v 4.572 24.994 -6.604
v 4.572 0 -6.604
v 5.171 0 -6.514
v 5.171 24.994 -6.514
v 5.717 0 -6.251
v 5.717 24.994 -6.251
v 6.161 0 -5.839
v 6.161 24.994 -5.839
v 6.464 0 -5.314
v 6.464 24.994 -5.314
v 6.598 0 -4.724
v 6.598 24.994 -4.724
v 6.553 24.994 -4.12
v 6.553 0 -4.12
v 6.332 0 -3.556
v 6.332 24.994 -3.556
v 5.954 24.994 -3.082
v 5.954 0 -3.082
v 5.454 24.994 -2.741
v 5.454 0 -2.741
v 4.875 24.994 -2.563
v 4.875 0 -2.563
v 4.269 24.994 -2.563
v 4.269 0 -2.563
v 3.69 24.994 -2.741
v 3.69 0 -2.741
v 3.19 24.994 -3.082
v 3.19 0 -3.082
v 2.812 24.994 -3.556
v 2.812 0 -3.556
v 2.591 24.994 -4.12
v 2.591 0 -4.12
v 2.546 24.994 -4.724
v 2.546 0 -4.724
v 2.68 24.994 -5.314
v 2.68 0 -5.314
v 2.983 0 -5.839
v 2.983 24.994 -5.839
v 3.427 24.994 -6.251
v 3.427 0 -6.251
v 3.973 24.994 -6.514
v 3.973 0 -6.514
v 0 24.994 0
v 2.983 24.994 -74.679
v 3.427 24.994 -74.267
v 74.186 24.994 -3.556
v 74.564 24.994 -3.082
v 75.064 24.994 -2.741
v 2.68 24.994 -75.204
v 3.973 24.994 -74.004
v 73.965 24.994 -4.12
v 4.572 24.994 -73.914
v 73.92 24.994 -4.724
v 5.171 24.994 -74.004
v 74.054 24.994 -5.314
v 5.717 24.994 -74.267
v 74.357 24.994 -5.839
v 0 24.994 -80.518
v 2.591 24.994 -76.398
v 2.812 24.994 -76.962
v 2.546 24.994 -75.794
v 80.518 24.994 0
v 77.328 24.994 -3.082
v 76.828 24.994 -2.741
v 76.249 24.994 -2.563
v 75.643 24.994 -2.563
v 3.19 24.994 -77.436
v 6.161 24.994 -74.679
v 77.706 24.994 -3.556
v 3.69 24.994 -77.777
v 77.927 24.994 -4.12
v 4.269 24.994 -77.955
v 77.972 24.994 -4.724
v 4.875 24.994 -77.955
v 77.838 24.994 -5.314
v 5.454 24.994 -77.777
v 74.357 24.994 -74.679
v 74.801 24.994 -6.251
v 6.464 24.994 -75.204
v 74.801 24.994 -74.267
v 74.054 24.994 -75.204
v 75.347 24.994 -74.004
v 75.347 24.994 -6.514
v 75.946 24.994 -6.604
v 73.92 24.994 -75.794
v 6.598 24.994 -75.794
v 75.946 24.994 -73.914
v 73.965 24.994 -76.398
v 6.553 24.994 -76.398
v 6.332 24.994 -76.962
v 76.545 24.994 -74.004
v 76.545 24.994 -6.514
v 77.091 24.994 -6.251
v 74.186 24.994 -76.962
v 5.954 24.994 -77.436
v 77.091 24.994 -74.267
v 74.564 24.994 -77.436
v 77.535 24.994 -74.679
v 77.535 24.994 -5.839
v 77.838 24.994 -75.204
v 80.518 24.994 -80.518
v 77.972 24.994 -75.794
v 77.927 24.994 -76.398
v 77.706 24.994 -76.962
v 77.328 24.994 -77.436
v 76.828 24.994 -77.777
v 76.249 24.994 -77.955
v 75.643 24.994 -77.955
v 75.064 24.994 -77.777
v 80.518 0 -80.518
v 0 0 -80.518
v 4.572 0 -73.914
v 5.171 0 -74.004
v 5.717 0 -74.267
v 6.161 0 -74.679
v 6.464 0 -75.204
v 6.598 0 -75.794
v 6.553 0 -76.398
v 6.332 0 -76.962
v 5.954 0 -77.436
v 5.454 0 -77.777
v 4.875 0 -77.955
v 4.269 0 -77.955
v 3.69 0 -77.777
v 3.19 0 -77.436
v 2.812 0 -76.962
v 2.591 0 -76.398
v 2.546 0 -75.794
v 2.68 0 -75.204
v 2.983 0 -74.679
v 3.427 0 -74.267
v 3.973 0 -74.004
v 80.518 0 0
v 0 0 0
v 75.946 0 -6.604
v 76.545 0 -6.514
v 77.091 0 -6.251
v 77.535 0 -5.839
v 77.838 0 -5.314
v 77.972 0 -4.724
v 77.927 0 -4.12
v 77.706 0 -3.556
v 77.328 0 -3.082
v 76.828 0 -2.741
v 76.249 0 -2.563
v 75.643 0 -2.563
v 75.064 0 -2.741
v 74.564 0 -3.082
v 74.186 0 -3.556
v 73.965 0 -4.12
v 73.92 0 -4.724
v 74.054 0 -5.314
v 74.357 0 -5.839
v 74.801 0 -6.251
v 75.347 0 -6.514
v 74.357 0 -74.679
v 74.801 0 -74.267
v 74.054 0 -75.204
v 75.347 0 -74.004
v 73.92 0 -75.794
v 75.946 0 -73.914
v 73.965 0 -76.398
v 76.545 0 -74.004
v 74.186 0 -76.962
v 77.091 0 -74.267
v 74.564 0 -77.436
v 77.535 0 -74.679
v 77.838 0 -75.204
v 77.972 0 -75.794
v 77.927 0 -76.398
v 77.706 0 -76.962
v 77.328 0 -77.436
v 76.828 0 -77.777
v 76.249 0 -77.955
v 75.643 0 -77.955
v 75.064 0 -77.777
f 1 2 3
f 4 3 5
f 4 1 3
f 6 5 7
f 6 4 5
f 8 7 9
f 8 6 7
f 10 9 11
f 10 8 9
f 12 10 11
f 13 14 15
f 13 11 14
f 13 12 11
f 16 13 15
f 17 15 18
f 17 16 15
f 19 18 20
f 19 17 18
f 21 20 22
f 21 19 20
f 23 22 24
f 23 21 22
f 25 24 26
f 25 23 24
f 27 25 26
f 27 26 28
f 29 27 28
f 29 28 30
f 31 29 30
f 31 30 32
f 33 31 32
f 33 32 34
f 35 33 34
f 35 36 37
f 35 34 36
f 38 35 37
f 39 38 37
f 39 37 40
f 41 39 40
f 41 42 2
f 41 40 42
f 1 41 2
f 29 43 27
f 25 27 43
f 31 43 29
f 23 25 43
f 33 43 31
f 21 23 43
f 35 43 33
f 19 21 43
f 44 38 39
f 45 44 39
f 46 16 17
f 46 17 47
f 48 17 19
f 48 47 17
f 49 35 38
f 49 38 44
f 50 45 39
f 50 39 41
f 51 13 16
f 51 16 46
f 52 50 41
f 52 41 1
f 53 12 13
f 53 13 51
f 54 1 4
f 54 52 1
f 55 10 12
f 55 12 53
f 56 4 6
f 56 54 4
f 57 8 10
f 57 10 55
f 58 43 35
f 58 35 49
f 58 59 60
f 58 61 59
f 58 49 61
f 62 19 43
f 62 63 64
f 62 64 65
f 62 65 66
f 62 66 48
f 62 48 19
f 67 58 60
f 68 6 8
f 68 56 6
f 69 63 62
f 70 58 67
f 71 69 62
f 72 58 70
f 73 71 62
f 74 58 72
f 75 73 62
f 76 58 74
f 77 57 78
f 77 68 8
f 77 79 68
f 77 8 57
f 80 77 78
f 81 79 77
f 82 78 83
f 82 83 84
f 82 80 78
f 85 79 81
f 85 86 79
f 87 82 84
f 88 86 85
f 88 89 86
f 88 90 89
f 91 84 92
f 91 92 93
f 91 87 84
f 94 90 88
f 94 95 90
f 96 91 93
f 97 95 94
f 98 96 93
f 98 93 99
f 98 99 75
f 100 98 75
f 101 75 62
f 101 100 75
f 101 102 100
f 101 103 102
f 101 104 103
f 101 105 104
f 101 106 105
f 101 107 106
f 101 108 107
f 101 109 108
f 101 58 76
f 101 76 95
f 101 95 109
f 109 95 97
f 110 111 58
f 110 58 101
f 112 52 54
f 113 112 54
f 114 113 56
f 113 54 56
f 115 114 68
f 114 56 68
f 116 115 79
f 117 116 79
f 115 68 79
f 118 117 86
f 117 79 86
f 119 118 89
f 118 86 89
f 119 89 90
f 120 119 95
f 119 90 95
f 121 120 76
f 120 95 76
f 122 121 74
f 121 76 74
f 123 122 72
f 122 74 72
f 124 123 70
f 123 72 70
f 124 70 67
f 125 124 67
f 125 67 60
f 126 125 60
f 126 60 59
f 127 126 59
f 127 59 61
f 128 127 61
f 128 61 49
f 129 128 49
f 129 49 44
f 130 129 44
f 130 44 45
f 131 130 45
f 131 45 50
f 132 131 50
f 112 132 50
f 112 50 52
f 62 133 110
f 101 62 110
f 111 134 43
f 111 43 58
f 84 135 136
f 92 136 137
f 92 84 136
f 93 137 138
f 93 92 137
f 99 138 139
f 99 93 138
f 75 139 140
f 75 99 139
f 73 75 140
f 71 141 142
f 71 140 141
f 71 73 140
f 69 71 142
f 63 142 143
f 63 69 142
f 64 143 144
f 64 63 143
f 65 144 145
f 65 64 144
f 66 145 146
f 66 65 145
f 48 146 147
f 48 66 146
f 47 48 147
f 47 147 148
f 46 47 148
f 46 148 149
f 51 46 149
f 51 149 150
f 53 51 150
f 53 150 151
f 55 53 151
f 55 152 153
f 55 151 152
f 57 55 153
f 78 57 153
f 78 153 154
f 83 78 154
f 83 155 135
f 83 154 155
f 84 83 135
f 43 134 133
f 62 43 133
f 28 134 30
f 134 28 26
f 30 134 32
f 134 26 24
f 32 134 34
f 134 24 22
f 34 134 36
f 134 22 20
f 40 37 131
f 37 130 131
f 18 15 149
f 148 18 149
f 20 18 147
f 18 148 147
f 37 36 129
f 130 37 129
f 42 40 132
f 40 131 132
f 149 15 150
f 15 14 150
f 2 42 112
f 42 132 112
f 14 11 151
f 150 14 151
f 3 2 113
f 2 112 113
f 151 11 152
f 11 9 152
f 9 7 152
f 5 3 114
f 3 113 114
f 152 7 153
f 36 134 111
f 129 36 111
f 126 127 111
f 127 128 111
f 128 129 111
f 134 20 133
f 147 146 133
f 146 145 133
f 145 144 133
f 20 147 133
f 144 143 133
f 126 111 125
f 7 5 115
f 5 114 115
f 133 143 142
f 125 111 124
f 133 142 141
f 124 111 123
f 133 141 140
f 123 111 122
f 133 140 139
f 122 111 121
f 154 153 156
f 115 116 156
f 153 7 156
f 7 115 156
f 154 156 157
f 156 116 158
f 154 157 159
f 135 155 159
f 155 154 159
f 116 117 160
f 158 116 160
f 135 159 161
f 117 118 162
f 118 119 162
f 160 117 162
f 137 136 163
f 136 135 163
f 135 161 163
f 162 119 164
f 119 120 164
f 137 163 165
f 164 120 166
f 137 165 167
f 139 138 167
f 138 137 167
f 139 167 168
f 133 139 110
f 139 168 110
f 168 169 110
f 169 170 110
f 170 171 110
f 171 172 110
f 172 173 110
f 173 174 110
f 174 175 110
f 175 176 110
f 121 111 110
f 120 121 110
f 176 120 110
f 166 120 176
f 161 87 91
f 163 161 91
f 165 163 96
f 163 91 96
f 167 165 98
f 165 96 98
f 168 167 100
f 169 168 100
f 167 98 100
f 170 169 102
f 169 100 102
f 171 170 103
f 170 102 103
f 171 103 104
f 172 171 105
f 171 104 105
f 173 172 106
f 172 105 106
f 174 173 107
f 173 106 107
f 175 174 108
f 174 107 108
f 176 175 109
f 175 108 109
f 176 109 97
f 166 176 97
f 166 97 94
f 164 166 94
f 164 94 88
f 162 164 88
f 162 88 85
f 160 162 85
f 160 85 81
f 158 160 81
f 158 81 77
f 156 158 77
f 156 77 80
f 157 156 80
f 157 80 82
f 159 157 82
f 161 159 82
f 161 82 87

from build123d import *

# Parameters (mm, degrees)
SKETCH1_W           = 80.518
SKETCH1_H           = 80.518
BOSS_EXTRUDE1_DEPTH = 24.9936
SKETCH2_R           = 2.032
CUT_EXTRUDE1_DEPTH  = 117.580344351


with BuildPart() as part:
    # Sketch1 → Boss-Extrude1 (new body)
    with BuildSketch(Plane(origin=(0, 0, 0), x_dir=(1, 0, 0), z_dir=(0, 1, 0))):
        with Locations((40.259, 40.259)):
            Rectangle(SKETCH1_W, SKETCH1_H)
    extrude(amount=BOSS_EXTRUDE1_DEPTH)

    # Sketch2 → Cut-Extrude1 (cut, through all)
    with BuildSketch(Plane(origin=(0, 24.9936, 0), x_dir=(1, 0, 0), z_dir=(0, 1, 0))):
        with Locations(Location((4.572, 75.946, 0), (0, 0, 270))):
            Circle(SKETCH2_R)
        with Locations(Location((75.946, 75.946, 0), (0, 0, 270))):
            Circle(SKETCH2_R)
    cut_extrude1 = extrude(amount=-CUT_EXTRUDE1_DEPTH, mode=Mode.SUBTRACT)

    # Mirror1: Cut-Extrude1 across plane
    add(cut_extrude1.mirror(Plane(origin=(0, 0, -40.259), x_dir=(1, 0, 0), z_dir=(0, 0, -1))), mode=Mode.SUBTRACT)


solid = part.part
